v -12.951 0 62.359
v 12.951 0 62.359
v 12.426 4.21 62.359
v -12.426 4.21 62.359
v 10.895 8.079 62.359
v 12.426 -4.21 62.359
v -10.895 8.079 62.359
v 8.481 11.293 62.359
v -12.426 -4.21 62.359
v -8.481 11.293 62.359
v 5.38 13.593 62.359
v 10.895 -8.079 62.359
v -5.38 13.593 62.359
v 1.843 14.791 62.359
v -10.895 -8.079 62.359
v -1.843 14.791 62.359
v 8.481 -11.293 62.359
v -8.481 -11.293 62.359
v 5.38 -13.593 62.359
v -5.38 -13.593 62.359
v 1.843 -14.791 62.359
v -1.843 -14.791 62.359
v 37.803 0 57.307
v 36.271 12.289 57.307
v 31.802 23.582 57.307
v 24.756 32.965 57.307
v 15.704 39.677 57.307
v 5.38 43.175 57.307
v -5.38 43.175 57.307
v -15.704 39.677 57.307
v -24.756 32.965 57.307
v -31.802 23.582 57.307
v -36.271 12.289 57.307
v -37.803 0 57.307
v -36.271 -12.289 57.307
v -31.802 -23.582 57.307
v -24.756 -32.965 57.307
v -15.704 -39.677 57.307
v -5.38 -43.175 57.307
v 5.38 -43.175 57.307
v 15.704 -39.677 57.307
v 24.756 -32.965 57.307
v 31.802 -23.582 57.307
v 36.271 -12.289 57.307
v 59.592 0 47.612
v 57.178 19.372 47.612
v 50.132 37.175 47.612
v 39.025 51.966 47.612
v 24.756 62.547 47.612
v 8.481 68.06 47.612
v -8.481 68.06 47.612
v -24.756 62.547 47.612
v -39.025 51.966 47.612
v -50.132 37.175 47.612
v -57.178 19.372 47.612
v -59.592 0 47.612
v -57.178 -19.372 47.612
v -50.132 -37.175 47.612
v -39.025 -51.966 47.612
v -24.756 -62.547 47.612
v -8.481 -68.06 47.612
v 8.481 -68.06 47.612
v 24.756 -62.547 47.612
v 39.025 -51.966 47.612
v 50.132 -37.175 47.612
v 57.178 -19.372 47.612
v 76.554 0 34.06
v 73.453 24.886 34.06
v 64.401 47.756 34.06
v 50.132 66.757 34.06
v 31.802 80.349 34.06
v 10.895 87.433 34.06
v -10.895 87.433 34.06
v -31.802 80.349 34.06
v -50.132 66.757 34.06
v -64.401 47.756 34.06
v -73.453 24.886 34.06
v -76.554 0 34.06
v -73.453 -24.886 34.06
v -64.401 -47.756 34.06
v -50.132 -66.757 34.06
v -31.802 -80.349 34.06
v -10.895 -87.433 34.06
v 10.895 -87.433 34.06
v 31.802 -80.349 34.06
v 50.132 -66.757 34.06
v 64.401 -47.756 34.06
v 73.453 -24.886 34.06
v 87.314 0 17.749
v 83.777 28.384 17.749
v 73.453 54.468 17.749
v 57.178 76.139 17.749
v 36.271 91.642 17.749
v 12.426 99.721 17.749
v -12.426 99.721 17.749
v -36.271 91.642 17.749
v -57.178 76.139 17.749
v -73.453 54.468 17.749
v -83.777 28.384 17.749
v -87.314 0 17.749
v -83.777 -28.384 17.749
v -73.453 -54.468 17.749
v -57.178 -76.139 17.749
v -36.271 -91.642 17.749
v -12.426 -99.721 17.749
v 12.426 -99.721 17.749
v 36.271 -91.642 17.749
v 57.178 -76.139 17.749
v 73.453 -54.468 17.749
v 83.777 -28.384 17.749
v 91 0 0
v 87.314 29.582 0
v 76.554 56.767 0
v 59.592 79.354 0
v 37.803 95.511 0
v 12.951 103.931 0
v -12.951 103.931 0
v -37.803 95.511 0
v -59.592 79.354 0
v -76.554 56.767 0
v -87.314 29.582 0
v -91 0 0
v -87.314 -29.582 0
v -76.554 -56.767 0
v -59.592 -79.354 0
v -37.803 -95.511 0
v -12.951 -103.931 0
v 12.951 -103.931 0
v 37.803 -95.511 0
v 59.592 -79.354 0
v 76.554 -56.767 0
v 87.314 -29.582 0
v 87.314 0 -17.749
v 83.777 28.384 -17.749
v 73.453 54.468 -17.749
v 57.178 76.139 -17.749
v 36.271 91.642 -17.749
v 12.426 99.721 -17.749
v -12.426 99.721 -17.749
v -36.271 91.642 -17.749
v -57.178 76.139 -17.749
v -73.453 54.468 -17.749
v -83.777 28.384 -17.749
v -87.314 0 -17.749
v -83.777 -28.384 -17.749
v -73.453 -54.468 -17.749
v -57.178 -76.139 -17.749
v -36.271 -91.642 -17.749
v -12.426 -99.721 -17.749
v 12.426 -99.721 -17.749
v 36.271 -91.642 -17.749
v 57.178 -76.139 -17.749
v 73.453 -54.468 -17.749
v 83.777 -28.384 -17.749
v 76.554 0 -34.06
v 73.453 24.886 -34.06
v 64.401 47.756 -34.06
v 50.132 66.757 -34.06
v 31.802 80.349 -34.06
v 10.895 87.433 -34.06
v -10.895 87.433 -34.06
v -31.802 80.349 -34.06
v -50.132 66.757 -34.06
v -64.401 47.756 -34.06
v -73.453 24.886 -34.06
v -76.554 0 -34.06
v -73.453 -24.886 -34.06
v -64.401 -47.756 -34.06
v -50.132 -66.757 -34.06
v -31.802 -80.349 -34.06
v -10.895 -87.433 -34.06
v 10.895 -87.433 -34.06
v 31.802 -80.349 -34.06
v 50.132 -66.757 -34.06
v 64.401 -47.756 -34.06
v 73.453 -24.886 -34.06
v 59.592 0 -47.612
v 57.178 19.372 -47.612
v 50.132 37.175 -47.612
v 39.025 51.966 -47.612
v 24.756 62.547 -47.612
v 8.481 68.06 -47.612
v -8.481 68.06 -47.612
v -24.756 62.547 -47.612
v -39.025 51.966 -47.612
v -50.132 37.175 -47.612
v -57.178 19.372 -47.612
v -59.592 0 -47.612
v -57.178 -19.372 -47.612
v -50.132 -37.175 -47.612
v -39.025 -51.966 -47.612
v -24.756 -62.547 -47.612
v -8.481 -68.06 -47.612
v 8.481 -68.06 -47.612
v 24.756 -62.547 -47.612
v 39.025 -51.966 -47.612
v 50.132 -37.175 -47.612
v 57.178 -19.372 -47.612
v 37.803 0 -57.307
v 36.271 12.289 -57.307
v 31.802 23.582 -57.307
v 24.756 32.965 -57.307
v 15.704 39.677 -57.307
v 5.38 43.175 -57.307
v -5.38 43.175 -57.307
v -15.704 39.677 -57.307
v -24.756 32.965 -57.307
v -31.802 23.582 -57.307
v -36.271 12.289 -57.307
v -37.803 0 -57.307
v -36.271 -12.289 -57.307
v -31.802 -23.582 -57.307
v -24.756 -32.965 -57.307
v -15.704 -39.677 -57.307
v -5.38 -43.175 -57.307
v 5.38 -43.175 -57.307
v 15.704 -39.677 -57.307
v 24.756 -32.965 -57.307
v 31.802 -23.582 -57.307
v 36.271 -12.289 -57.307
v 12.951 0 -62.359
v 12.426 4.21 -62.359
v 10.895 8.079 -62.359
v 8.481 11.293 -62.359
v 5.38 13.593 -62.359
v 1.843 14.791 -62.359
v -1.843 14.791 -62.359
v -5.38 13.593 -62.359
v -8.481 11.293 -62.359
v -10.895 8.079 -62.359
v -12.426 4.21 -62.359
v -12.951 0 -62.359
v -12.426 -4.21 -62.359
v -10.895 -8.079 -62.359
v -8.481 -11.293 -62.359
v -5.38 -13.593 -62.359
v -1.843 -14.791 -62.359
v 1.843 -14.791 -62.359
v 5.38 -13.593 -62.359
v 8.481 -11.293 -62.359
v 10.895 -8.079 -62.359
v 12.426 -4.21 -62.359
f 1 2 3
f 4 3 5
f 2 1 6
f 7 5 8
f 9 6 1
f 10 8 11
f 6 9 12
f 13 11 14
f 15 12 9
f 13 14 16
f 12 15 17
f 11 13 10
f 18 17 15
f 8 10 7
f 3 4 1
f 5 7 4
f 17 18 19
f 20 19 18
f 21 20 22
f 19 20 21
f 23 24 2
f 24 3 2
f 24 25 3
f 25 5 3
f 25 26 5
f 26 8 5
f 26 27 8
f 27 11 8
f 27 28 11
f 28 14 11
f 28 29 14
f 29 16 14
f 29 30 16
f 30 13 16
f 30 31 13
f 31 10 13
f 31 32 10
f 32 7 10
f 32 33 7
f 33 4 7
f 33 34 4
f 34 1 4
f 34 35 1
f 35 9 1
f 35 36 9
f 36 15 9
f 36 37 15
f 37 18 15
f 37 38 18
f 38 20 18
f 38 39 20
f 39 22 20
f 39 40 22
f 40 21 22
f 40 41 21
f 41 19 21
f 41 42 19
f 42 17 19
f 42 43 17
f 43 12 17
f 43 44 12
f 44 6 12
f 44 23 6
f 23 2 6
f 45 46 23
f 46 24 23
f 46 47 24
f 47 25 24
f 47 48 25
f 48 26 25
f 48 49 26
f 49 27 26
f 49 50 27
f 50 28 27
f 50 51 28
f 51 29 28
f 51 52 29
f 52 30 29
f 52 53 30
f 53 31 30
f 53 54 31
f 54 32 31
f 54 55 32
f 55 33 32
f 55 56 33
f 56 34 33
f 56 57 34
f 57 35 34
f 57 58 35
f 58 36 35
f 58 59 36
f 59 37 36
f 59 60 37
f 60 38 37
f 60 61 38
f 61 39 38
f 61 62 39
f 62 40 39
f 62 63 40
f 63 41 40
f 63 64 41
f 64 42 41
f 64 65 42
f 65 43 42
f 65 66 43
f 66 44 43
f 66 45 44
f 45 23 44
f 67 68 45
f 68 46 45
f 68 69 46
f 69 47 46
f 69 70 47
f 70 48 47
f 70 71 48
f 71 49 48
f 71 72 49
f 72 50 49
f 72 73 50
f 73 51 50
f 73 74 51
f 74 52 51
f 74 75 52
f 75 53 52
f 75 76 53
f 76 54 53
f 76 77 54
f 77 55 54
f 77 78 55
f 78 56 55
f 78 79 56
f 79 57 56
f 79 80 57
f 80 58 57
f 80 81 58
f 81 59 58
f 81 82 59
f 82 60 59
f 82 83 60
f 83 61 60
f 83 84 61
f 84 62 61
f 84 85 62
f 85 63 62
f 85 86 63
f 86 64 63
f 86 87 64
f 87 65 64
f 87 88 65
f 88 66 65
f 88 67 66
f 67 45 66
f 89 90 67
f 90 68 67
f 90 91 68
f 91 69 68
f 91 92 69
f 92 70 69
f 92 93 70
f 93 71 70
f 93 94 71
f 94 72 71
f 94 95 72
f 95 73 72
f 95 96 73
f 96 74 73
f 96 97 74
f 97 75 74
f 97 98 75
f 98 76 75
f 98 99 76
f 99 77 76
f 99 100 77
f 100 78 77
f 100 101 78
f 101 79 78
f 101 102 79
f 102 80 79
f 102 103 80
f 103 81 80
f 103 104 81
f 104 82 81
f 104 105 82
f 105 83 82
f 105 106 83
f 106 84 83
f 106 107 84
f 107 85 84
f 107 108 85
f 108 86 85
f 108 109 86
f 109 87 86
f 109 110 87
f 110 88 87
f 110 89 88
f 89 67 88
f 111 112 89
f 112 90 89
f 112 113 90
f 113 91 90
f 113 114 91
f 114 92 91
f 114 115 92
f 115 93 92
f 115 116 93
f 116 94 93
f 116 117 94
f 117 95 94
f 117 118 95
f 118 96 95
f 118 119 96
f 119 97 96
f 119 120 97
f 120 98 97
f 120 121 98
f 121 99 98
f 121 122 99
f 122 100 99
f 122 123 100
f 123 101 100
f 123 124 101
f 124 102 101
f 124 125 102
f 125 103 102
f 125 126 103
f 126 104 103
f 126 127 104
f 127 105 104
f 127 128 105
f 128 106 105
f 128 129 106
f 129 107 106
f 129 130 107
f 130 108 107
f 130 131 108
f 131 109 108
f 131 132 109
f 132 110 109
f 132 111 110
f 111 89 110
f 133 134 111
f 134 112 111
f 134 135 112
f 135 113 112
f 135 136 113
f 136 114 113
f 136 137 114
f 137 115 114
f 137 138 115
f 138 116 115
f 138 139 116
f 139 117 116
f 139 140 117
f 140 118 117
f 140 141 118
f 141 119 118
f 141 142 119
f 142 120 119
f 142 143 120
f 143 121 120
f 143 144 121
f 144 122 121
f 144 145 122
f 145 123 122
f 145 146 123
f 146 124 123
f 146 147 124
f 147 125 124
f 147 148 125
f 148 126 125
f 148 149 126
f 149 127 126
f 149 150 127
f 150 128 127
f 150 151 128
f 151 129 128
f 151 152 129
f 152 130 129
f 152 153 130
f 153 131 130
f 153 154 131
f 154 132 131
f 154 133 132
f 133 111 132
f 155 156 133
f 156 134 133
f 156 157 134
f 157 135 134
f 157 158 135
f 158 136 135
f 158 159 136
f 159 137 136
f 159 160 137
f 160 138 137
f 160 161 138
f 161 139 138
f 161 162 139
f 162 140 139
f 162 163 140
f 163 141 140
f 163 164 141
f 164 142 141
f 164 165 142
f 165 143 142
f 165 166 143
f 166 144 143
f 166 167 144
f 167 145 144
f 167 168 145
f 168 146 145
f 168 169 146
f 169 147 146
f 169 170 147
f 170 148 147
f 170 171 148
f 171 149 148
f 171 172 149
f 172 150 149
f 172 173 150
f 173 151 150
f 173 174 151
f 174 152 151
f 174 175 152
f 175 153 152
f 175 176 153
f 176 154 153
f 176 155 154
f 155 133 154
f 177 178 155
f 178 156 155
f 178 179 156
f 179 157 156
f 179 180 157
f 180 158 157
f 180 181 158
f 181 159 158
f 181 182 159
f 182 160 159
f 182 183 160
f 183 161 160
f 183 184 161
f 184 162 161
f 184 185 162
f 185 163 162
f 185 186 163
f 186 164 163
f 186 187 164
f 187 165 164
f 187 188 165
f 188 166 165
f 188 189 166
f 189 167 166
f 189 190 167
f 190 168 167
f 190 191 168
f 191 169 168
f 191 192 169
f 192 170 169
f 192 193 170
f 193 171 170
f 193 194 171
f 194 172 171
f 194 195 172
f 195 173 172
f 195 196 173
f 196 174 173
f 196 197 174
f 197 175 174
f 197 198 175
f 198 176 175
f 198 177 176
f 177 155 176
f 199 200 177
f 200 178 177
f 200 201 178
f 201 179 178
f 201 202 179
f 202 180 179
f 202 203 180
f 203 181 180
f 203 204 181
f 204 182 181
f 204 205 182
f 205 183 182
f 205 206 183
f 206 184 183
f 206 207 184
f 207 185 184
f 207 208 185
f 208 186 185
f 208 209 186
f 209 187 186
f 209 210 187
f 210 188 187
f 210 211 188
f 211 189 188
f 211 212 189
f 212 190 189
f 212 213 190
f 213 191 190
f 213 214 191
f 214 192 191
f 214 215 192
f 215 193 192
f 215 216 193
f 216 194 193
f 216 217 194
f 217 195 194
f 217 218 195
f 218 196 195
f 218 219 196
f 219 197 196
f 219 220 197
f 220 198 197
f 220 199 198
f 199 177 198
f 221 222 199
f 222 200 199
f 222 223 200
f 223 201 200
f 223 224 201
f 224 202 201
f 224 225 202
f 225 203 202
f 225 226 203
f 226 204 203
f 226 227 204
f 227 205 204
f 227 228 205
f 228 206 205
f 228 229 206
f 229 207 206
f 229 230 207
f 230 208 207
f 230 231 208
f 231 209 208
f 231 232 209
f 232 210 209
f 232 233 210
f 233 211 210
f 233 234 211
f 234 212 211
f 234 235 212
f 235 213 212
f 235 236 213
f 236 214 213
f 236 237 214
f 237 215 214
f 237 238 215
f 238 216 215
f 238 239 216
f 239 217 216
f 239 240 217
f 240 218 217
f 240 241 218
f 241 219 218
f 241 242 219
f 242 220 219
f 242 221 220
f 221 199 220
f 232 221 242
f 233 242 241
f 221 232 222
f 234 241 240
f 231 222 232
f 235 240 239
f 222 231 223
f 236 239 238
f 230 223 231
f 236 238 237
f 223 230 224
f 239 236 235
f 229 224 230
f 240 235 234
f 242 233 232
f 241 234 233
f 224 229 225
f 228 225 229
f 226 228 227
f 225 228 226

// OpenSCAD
// Generated by SolidPython 1.0.1 on 2020-07-29 00:46:51


scale(v = [13, 15, 9]) {
	sphere(r = 7);
}
/***********************************************
*********      SolidPython code:      **********
************************************************
 
# import packages: SolidPython
from solid import *
from solid.utils import *
from itertools import chain, combinations, permutations


class Resize:

    def __init__(self, scad_file):
        self.scad_file = scad_file
        #self.scad_file = import_scad(scad_file)
        # cone/cylinder param:
        self.r1 = 0
        self.r2 = 0
        self.h = 0
        # rectangular prism param:
        self.w = 0
        self.l = 0
        # ellipse param:
        self.r = 0

    # import OpenScad code (file name corresponds to shape)


    # classify shape + parameters
    def assign(self, param1, param2, param3):
        if self.scad_file == 'cone.scad':
            self.r1 = param1
            self.r2 = param2
            self.h = param3
        elif self.scad_file == 'cylinder.scad':
            self.r1 = param1
            self.r2 = param2
            self.h = param3
        elif self.scad_file == 'rectangularPrism.scad':
            self.h = param1
            self.l = param2
            self.w = param3
        else:
            self.r = param1
            self.h = param2

    # resize parameters
    def iterate(self):
        x = range(3, 20, 2)
        i = 1
        if self.scad_file == 'cone.scad':
            tempList = list(permutations(x, 2))
            for temp in tempList:
                param1 = temp[0]
                param2 = temp[1]
                filepath = 'produced_scad_files/' + 'cone' + str(param1) + '_' + str(param2) + '_' + '.scad'
                scad_render_to_file(cylinder(h=param1, r1=param2, r2=0), filepath)

        elif self.scad_file == 'cylinder.scad':
            tempList = list(permutations(x, 3))
            for temp in tempList:
                param1 = temp[0]
                param2 = temp[1]
                filepath = 'produced_scad_files/' + 'cylinder' + str(param1) + '_' + str(param2) + '_' + '.scad'
                scad_render_to_file(cylinder(h=param1, r1=param2, r2=param2), filepath)

        elif self.scad_file == 'rectangularPrism.scad':
            tempList = list(permutations(x, 3))
            for temp in tempList:
                param1 = temp[0]
                param2 = temp[1]
                param3 = temp[2]
                filepath = 'produced_scad_files/' + 'rectangularPrism' + str(param1) + '_' + str(param2) + '_' + str(
                    param3) + '.scad'
                scad_render_to_file(cube(size=(param1, param2, param3)), filepath)

        elif self.scad_file == 'ellipse.scad':
            tempList = list(permutations(x, 4))
            for temp in tempList:
                param1 = temp[0]
                param2 = temp[1]
                param3 = temp[2]
                param4 = temp[3]
                filepath = 'produced_scad_files/' + 'ellipse' + str(param1) + '_' + str(param2) + '_' + str(param3) + '_' + str(param4) + '.scad'
                scad_render_to_file(scale([param1, param2, param3])(sphere(r=param4)), filepath)

    def render_to_scadfile(self):
        scad_render_to_file(scad, 'example.scad') 
 
************************************************/
